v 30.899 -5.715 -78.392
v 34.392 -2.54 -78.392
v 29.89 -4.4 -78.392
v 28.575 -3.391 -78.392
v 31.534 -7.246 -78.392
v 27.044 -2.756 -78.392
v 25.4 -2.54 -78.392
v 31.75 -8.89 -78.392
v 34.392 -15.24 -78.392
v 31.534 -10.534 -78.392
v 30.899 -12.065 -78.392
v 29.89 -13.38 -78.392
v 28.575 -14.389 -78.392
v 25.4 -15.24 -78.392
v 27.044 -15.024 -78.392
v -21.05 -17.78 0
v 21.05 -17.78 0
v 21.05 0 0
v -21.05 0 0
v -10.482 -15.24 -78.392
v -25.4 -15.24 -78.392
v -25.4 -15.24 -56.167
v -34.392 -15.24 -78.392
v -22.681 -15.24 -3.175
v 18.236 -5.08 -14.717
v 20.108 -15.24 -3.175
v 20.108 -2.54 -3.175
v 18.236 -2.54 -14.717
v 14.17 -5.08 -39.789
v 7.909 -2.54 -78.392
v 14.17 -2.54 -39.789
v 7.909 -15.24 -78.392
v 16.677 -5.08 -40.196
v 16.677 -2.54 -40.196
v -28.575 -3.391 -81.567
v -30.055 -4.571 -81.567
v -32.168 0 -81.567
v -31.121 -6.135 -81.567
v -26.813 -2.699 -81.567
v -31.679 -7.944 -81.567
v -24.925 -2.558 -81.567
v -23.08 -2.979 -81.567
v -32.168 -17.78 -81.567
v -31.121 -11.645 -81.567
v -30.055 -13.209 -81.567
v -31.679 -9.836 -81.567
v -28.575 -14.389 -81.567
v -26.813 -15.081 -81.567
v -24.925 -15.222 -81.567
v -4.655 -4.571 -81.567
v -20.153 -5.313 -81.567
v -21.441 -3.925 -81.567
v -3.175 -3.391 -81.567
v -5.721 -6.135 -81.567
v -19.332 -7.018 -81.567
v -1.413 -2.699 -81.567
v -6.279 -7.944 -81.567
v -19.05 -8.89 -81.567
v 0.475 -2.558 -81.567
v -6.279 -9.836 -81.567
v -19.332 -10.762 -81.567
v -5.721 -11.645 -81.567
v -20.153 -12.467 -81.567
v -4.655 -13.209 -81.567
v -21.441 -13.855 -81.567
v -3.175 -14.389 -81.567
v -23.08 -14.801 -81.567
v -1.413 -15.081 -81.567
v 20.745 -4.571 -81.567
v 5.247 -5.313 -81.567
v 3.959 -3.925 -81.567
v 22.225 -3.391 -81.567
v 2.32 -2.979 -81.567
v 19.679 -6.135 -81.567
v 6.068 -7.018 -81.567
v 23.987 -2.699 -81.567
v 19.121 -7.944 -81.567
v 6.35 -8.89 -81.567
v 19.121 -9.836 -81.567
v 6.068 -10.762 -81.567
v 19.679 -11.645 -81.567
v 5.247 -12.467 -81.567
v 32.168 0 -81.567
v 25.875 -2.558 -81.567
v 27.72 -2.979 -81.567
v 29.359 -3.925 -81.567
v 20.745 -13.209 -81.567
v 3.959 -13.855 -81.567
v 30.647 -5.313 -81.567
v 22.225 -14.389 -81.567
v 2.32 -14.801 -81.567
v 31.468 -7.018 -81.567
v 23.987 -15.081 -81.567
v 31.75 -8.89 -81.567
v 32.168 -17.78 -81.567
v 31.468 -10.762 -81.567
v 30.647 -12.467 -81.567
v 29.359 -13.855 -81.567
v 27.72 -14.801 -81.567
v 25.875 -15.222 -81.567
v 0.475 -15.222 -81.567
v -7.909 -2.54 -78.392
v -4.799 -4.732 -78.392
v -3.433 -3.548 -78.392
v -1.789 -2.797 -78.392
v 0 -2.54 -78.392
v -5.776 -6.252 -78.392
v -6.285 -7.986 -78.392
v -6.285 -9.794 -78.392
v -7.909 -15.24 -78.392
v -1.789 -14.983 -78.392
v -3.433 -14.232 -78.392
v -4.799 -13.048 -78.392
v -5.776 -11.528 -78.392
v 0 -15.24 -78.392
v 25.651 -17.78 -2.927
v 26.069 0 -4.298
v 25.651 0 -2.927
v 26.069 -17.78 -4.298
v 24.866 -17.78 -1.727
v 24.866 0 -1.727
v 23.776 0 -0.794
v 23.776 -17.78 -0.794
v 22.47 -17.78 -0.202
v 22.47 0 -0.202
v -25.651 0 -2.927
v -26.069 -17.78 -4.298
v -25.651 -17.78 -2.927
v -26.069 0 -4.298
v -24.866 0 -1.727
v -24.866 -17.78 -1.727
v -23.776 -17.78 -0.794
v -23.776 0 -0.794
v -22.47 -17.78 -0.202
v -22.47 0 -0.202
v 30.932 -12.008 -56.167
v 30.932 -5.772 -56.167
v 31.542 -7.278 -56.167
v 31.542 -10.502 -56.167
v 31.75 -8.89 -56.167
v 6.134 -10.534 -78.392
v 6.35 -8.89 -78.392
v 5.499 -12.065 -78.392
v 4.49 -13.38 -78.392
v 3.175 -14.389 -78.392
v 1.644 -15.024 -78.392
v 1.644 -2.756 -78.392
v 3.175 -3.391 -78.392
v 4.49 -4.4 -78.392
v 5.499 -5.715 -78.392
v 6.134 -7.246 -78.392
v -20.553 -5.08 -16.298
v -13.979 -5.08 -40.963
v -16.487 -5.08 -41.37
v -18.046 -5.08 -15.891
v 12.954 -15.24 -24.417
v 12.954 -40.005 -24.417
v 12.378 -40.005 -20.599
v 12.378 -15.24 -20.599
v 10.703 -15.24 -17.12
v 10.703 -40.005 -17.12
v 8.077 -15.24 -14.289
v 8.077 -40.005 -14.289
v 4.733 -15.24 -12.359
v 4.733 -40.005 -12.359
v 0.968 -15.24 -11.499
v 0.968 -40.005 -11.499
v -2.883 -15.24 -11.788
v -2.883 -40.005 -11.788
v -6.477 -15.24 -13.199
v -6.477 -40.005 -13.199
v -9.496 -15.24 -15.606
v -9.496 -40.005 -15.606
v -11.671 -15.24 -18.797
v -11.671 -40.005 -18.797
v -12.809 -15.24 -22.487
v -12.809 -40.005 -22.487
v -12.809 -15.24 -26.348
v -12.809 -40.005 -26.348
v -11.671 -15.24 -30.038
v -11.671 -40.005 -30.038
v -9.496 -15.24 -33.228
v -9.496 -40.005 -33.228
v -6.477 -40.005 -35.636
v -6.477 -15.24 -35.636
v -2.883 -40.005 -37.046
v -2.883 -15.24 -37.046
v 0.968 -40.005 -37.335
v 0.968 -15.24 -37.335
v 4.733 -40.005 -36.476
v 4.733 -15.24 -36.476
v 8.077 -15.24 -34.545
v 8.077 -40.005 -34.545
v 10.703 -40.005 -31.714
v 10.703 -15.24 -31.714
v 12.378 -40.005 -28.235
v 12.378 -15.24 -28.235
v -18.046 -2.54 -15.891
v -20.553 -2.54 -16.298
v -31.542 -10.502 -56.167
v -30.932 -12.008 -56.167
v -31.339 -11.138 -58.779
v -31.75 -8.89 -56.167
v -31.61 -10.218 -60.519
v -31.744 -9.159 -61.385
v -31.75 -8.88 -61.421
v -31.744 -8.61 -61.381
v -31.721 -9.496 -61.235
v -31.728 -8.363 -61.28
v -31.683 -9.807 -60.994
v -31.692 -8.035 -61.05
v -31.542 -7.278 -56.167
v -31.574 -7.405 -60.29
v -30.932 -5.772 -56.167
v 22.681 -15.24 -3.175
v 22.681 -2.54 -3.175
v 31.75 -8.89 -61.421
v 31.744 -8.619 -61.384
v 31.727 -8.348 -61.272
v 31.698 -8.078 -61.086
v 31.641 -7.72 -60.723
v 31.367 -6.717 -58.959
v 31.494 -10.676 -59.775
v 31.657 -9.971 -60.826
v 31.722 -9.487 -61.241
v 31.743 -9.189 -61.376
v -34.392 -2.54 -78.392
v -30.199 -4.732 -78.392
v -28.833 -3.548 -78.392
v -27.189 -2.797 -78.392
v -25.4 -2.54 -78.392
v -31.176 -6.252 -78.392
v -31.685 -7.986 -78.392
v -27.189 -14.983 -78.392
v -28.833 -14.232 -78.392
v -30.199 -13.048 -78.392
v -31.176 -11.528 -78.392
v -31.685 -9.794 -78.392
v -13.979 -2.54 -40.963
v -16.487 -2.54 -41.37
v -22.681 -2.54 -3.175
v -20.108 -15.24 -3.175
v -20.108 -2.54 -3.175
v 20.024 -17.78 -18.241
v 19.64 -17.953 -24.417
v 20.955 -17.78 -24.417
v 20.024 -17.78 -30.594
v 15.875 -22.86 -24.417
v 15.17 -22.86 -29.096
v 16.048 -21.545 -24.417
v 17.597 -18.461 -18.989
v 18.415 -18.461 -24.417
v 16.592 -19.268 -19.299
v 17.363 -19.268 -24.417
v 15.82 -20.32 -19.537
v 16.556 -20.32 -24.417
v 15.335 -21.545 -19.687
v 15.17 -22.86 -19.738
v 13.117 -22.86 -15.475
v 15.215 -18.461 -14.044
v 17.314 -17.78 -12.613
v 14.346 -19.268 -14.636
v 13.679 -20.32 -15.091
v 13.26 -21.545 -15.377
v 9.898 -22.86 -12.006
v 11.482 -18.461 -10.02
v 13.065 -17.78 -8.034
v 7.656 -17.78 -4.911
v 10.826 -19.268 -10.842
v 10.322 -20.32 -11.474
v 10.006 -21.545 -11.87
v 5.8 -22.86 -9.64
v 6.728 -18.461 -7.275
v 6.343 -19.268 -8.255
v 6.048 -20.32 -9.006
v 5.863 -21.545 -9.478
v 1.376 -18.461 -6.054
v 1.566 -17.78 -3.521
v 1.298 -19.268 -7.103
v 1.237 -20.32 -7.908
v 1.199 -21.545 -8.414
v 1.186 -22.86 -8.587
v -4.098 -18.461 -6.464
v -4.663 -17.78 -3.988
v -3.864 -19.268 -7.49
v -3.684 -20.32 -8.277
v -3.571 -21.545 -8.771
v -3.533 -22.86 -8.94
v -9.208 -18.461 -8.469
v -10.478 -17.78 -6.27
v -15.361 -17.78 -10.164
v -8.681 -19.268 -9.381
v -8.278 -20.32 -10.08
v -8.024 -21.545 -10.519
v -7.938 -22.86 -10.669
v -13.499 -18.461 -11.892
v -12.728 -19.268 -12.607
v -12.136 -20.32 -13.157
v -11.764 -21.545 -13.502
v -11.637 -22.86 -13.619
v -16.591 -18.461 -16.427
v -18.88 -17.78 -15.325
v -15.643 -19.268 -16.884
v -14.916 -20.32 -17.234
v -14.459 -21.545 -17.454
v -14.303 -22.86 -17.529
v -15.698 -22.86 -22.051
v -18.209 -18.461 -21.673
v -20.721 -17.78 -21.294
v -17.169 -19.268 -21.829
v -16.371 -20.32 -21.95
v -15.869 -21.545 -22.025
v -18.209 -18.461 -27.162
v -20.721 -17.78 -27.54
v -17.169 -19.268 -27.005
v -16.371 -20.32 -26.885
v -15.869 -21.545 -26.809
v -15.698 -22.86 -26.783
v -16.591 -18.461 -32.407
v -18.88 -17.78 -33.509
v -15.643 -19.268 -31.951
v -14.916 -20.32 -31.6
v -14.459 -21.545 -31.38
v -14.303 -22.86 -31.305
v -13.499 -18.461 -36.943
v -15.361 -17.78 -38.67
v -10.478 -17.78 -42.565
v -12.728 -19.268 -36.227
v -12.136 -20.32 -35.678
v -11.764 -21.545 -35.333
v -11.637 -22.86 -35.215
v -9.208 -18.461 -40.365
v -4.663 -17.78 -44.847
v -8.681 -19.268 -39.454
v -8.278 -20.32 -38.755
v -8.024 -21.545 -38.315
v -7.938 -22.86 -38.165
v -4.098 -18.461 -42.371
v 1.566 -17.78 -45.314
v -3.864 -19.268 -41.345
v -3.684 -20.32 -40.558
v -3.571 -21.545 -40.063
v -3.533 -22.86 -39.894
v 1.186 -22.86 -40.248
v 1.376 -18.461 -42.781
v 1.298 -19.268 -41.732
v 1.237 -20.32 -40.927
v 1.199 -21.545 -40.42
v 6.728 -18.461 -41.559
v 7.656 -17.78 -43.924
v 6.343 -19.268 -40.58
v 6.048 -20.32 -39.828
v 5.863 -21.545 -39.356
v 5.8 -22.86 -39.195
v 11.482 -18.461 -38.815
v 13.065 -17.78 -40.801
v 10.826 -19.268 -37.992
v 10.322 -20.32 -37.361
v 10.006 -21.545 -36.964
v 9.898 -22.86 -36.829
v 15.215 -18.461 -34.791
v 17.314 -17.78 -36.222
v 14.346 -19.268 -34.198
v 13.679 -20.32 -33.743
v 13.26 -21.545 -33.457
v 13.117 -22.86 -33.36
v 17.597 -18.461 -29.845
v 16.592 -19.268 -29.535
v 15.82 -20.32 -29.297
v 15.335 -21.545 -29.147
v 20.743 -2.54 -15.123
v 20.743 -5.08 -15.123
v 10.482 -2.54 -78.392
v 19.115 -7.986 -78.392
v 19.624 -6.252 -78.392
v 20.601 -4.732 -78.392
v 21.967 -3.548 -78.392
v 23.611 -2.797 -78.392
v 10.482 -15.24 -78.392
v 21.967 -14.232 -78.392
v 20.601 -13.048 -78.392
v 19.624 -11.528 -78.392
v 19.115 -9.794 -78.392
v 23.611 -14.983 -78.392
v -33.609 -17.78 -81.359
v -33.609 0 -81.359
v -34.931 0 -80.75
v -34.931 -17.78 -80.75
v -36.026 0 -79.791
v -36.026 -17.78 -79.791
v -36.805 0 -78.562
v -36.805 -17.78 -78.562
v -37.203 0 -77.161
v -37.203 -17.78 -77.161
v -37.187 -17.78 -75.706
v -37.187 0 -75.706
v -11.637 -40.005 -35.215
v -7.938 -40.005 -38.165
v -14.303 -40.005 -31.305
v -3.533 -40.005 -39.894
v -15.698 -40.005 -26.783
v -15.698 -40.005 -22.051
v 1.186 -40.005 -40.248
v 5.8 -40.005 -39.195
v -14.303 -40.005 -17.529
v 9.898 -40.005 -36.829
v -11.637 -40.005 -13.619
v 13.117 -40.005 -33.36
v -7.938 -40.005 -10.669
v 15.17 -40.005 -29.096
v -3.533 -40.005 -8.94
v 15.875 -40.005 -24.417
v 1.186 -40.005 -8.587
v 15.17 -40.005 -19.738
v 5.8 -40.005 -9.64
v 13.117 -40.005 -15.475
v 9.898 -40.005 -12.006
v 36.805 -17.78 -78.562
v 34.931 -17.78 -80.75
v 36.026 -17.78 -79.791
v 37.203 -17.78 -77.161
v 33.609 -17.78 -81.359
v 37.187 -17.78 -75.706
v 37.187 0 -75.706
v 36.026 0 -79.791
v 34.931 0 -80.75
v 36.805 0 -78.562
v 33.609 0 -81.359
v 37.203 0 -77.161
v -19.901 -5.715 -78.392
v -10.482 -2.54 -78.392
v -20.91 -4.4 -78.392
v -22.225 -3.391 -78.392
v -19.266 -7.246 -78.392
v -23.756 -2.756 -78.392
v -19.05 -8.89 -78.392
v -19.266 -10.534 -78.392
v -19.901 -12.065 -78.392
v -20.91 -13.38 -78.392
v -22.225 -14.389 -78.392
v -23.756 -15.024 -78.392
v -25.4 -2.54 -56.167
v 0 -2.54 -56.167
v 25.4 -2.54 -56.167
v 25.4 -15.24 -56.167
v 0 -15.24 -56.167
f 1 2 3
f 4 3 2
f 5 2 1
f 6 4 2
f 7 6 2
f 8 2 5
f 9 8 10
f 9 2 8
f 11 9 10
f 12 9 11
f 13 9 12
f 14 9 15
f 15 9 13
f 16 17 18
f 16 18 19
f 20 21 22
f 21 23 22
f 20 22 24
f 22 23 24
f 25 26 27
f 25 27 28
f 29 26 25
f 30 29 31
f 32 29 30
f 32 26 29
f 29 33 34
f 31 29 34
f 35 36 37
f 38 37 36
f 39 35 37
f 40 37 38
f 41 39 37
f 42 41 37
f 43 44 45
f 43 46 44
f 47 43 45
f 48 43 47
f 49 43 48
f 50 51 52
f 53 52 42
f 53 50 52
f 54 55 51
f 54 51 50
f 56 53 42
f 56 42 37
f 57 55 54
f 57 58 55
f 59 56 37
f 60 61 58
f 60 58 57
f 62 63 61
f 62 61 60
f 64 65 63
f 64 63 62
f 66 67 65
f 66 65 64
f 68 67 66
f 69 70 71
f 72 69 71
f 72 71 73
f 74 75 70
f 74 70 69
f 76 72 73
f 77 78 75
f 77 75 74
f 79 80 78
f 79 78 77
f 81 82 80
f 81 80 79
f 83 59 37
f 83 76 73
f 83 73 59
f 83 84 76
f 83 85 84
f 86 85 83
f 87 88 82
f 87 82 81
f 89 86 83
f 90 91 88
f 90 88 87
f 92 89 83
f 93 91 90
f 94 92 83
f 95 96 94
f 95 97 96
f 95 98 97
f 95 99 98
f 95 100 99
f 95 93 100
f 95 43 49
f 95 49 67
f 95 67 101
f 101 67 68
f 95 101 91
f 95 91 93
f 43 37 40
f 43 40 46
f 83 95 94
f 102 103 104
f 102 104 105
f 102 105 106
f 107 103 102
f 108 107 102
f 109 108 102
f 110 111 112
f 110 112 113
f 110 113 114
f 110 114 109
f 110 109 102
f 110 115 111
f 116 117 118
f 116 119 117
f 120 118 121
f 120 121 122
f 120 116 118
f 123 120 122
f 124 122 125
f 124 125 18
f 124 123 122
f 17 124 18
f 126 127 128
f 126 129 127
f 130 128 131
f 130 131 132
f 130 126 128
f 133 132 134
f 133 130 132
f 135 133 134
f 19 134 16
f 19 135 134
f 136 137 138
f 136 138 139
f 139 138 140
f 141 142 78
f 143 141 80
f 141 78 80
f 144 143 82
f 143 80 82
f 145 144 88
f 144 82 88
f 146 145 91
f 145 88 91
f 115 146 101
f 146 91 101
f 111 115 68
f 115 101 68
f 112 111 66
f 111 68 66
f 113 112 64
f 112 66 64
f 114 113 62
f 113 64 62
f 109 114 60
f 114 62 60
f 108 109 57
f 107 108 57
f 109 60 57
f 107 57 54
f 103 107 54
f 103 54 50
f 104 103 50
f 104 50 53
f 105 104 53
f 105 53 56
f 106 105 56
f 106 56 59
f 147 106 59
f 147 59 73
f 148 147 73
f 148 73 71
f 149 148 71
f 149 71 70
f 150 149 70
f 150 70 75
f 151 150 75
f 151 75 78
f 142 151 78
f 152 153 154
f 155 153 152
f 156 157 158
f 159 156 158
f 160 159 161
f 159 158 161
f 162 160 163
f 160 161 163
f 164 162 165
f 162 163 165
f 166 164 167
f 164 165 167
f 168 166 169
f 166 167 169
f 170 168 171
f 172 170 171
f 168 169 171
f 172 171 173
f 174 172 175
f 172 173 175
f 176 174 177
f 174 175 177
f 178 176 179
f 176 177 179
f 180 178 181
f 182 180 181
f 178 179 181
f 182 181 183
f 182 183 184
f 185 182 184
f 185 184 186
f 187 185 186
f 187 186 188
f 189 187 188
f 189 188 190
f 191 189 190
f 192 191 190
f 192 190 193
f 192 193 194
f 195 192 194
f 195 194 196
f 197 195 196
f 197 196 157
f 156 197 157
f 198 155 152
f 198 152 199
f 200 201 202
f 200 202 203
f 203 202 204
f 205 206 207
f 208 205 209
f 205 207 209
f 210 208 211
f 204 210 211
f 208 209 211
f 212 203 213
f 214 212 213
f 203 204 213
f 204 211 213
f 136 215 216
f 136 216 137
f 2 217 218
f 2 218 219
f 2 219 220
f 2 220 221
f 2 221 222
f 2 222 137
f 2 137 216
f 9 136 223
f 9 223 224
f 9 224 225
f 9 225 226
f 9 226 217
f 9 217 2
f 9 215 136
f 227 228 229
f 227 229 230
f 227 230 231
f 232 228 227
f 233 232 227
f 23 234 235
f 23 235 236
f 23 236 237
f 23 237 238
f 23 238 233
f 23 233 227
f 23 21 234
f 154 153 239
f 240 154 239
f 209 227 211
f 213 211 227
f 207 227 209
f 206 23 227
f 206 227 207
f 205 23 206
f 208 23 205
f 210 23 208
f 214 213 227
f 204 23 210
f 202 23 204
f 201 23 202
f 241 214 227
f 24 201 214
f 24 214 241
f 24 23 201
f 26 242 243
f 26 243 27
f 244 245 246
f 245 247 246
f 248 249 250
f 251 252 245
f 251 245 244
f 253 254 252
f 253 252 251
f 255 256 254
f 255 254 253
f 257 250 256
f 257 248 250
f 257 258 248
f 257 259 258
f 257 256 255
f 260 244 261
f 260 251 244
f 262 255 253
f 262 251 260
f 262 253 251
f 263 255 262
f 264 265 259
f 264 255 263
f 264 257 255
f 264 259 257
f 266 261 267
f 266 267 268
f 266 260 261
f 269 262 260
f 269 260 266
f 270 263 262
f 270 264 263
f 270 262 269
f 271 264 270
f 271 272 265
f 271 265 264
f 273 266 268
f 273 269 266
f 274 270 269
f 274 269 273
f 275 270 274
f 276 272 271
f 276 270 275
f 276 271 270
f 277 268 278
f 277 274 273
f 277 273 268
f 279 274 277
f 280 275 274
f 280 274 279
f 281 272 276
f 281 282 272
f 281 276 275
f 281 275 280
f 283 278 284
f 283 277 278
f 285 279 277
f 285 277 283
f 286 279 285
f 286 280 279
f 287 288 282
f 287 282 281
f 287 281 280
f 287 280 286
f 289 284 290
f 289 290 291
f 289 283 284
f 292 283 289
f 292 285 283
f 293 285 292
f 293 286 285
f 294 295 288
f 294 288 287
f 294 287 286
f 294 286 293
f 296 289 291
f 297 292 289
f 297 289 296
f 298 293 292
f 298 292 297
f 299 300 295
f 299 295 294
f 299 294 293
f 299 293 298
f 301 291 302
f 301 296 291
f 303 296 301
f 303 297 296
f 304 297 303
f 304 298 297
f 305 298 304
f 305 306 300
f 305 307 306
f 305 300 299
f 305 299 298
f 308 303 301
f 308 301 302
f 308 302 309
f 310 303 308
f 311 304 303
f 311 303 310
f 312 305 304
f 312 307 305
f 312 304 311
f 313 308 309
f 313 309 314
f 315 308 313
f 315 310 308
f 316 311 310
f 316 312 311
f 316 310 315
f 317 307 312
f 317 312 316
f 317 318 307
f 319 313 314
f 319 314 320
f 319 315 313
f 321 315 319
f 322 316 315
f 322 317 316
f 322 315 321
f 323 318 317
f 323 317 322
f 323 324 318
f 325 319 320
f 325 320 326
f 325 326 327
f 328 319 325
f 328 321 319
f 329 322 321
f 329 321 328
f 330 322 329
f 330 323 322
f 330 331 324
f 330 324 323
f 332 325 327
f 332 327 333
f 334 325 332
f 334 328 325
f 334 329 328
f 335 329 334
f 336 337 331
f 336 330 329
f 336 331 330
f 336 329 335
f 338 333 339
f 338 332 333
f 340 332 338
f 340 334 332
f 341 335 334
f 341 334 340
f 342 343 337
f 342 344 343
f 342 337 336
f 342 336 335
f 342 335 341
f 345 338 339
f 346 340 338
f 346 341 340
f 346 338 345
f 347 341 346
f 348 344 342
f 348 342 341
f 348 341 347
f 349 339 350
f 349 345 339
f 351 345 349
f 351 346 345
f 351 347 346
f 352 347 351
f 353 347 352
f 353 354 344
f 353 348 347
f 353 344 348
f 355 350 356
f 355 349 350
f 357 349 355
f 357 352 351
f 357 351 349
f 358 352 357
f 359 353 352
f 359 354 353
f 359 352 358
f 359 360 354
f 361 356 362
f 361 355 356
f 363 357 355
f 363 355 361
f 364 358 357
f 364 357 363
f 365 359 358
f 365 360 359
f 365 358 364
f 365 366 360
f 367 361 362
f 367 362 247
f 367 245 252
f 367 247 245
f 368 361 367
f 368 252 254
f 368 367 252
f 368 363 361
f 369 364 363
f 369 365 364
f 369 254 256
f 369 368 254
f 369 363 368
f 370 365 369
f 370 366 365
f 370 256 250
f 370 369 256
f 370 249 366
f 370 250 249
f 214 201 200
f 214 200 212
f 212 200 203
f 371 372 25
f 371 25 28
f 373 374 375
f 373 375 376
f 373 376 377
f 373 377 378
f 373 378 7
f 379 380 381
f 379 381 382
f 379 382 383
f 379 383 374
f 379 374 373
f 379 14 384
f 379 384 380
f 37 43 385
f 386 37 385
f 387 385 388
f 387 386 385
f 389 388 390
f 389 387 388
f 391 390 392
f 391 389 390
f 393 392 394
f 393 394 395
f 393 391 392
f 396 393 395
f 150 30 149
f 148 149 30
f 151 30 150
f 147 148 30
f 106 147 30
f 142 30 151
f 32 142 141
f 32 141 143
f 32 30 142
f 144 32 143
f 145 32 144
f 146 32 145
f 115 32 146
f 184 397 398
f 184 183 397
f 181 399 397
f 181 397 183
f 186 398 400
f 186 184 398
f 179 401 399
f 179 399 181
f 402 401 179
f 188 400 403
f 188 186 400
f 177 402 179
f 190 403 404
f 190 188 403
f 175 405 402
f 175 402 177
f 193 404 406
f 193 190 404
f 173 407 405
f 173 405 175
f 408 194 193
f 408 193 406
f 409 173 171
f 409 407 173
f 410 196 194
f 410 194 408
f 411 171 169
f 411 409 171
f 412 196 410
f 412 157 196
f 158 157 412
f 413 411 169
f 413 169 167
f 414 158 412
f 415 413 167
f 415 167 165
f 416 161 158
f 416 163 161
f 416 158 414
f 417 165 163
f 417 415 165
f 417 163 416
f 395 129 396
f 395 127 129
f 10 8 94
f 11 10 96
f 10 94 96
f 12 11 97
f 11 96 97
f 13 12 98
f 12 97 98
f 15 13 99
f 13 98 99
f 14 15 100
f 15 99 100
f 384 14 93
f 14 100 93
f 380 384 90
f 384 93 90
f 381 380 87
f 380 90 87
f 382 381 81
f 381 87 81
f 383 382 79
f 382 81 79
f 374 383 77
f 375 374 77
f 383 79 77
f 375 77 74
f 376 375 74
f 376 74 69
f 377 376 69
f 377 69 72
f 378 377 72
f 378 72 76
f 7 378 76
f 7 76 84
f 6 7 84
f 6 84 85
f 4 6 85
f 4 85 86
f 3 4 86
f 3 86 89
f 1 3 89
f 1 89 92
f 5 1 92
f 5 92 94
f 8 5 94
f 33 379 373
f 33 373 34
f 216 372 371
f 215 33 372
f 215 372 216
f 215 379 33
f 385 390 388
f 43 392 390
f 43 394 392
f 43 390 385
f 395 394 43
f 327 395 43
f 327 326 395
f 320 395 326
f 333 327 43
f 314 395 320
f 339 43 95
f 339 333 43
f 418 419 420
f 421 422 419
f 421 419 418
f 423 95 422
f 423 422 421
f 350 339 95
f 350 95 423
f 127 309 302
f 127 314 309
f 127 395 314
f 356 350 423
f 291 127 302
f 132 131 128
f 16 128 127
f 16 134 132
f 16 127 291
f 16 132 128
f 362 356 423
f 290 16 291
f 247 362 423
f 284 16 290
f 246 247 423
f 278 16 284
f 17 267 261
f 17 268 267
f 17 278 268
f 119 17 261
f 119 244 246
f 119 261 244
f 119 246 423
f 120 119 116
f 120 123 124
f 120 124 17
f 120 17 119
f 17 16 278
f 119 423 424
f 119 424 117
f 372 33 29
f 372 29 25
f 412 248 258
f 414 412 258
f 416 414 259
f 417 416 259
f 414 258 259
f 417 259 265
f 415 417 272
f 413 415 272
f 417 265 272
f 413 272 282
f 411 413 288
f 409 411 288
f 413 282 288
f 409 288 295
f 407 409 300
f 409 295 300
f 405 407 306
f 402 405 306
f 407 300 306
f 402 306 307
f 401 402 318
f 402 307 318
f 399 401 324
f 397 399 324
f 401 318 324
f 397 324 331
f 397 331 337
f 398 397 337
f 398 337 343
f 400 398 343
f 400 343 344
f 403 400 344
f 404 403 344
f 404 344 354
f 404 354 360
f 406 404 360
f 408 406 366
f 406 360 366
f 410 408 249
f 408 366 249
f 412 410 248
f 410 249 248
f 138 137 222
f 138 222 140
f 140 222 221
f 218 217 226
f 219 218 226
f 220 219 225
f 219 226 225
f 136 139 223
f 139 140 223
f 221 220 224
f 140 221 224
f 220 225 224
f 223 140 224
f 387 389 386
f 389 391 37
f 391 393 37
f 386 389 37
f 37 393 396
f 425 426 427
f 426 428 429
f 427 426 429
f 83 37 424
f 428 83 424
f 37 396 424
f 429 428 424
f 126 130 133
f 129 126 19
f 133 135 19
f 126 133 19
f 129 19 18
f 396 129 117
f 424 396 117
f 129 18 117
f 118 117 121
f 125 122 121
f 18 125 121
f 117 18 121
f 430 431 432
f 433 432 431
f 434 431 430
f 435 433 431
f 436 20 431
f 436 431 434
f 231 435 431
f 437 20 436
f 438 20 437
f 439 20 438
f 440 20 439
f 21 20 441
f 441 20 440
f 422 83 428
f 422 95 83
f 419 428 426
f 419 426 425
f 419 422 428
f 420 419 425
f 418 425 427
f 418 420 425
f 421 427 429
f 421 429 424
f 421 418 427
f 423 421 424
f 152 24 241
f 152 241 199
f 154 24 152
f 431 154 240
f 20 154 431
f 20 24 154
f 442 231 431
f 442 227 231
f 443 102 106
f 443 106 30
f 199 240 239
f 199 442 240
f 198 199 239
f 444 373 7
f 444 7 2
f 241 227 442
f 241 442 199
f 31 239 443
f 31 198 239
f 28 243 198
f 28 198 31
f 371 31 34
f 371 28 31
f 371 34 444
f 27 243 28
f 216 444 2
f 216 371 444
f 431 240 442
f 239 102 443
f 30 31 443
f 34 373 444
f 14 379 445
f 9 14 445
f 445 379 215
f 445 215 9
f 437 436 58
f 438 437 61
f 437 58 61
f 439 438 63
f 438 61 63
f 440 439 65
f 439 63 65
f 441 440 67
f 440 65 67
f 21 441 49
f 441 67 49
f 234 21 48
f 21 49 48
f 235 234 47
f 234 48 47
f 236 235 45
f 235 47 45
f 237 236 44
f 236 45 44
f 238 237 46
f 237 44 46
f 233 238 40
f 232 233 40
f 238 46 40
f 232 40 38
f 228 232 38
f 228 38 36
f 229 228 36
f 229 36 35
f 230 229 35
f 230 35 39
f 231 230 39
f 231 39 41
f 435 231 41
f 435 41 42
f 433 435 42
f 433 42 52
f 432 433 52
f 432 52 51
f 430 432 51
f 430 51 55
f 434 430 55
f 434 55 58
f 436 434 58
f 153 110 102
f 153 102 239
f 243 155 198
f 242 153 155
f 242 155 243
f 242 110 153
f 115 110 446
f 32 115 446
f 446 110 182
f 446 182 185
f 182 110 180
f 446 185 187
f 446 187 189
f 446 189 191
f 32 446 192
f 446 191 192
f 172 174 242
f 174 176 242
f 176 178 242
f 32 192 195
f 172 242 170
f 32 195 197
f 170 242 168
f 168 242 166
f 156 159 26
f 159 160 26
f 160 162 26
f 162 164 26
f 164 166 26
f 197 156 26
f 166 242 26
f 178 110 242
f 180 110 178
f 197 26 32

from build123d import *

# Parameters (mm, degrees)
F1_DEPTH  = 2.54
F3_DEPTH  = 6.35
F5_W      = 2.54
F5_H      = 25.4
F6_DEPTH  = 6.35
F7_W      = 2.54
F7_H      = 25.4
F8_DEPTH  = 6.35
F9_R      = 6.35
F10_DEPTH = 25.4
F11_R     = 15.875
F12_DEPTH = 22.225
F13_R     = 12.954
F14_DEPTH = 31.75
F15_R     = 5.08


with BuildPart() as f1:
    # F0 (on Front) → F1 (new body)
    with BuildSketch(Plane.XZ):
        Polygon((25.4, 0), (-25.4, 0), (-38.1, -81.5672268745), (38.1, -81.5672268745), align=None)
    extrude(amount=F1_DEPTH)

    # F2 (on face) → F3 (join)
    with BuildSketch(Plane.XZ.offset(2.54)):
        Polygon((-38.1, -81.5672268745), (38.1, -81.5672268745), (25.4, 0), (-25.4, 0), align=None)
        Polygon((20.1079053095, -3.175), (22.6810924375, -3.175), (34.3923987784, -78.3922268745), (10.4823719593, -78.3922268745), (7.9091848312, -78.3922268745), (-7.9091848312, -78.3922268745), (-10.4823719593, -78.3922268745), (-34.3923987784, -78.3922268745), (-22.6810924375, -3.175), (-20.1079053095, -3.175), align=None, mode=Mode.SUBTRACT)
        Polygon((-7.9091848312, -78.3922268745), (-20.1079053095, -3.175), (-22.6810924375, -3.175), (-10.4823719593, -78.3922268745), align=None)
        Polygon((10.4823719593, -78.3922268745), (22.6810924375, -3.175), (20.1079053095, -3.175), (7.9091848312, -78.3922268745), align=None)
    extrude(amount=F3_DEPTH)

    # F4: F1 across face


with BuildPart() as f1_1:
    add(f1.part)
    add(f1.part.mirror(Plane(origin=(0, -8.89, -43.1700299624), x_dir=(1, 0, 0), z_dir=(0, -1, 0))))

    # F5 (on face) → F6 (cut)
    with BuildSketch(Plane(origin=(22.6015407656, 0, -3.665515064), x_dir=(0, 1, 0), z_dir=(0.9871027149, 0, -0.1600881953))):
        with Locations((-3.81, -24.3075852952)):
            Rectangle(F5_W, F5_H)
    extrude(amount=-F6_DEPTH, mode=Mode.SUBTRACT)

    # F7 (on face) → F8 (cut)
    with BuildSketch(Plane(origin=(-20.0942998698, 0, -3.258891048), x_dir=(0, 1, 0), z_dir=(0.9871027149, 0, 0.1600881953))):
        with Locations((-3.81, -25.4971986666)):
            Rectangle(F7_W, F7_H)
    extrude(amount=-F8_DEPTH, mode=Mode.SUBTRACT)

    # F9 (on face) → F10 (cut)
    with BuildSketch(Plane(origin=(0, 0, -81.5672268745), x_dir=(1, 0, 0), z_dir=(0, 0, -1))):
        with Locations((-25.4, 8.89)):
            Circle(F9_R)
        with Locations((0, 8.89)):
            Circle(F9_R)
        with Locations((25.4, 8.89)):
            Circle(F9_R)
    extrude(amount=-F10_DEPTH, mode=Mode.SUBTRACT)

    # F11 (on face) → F12 (join)
    with BuildSketch(Plane.XZ.offset(17.78)):
        with Locations((0, -24.4172268745)):
            Circle(F11_R)
    extrude(amount=F12_DEPTH)

    # F13 (on face) → F14 (cut)
    with BuildSketch(Plane.XZ.offset(40.005)):
        with Locations((0, -24.4172268745)):
            Circle(F13_R)
    extrude(amount=-F14_DEPTH, mode=Mode.SUBTRACT)

    # F15
    f15_edges = [f1_1.edges().sort_by_distance(p)[0] for p in [
        (-15.875, -17.78, -24.417227),
        (-38.1, -8.89, -81.567227),
        (38.1, -8.89, -81.567227),
        (25.4, -8.89, 0),
        (-25.4, -8.89, 0),
    ]]
    fillet(f15_edges, radius=F15_R)


solid = f1_1.part
